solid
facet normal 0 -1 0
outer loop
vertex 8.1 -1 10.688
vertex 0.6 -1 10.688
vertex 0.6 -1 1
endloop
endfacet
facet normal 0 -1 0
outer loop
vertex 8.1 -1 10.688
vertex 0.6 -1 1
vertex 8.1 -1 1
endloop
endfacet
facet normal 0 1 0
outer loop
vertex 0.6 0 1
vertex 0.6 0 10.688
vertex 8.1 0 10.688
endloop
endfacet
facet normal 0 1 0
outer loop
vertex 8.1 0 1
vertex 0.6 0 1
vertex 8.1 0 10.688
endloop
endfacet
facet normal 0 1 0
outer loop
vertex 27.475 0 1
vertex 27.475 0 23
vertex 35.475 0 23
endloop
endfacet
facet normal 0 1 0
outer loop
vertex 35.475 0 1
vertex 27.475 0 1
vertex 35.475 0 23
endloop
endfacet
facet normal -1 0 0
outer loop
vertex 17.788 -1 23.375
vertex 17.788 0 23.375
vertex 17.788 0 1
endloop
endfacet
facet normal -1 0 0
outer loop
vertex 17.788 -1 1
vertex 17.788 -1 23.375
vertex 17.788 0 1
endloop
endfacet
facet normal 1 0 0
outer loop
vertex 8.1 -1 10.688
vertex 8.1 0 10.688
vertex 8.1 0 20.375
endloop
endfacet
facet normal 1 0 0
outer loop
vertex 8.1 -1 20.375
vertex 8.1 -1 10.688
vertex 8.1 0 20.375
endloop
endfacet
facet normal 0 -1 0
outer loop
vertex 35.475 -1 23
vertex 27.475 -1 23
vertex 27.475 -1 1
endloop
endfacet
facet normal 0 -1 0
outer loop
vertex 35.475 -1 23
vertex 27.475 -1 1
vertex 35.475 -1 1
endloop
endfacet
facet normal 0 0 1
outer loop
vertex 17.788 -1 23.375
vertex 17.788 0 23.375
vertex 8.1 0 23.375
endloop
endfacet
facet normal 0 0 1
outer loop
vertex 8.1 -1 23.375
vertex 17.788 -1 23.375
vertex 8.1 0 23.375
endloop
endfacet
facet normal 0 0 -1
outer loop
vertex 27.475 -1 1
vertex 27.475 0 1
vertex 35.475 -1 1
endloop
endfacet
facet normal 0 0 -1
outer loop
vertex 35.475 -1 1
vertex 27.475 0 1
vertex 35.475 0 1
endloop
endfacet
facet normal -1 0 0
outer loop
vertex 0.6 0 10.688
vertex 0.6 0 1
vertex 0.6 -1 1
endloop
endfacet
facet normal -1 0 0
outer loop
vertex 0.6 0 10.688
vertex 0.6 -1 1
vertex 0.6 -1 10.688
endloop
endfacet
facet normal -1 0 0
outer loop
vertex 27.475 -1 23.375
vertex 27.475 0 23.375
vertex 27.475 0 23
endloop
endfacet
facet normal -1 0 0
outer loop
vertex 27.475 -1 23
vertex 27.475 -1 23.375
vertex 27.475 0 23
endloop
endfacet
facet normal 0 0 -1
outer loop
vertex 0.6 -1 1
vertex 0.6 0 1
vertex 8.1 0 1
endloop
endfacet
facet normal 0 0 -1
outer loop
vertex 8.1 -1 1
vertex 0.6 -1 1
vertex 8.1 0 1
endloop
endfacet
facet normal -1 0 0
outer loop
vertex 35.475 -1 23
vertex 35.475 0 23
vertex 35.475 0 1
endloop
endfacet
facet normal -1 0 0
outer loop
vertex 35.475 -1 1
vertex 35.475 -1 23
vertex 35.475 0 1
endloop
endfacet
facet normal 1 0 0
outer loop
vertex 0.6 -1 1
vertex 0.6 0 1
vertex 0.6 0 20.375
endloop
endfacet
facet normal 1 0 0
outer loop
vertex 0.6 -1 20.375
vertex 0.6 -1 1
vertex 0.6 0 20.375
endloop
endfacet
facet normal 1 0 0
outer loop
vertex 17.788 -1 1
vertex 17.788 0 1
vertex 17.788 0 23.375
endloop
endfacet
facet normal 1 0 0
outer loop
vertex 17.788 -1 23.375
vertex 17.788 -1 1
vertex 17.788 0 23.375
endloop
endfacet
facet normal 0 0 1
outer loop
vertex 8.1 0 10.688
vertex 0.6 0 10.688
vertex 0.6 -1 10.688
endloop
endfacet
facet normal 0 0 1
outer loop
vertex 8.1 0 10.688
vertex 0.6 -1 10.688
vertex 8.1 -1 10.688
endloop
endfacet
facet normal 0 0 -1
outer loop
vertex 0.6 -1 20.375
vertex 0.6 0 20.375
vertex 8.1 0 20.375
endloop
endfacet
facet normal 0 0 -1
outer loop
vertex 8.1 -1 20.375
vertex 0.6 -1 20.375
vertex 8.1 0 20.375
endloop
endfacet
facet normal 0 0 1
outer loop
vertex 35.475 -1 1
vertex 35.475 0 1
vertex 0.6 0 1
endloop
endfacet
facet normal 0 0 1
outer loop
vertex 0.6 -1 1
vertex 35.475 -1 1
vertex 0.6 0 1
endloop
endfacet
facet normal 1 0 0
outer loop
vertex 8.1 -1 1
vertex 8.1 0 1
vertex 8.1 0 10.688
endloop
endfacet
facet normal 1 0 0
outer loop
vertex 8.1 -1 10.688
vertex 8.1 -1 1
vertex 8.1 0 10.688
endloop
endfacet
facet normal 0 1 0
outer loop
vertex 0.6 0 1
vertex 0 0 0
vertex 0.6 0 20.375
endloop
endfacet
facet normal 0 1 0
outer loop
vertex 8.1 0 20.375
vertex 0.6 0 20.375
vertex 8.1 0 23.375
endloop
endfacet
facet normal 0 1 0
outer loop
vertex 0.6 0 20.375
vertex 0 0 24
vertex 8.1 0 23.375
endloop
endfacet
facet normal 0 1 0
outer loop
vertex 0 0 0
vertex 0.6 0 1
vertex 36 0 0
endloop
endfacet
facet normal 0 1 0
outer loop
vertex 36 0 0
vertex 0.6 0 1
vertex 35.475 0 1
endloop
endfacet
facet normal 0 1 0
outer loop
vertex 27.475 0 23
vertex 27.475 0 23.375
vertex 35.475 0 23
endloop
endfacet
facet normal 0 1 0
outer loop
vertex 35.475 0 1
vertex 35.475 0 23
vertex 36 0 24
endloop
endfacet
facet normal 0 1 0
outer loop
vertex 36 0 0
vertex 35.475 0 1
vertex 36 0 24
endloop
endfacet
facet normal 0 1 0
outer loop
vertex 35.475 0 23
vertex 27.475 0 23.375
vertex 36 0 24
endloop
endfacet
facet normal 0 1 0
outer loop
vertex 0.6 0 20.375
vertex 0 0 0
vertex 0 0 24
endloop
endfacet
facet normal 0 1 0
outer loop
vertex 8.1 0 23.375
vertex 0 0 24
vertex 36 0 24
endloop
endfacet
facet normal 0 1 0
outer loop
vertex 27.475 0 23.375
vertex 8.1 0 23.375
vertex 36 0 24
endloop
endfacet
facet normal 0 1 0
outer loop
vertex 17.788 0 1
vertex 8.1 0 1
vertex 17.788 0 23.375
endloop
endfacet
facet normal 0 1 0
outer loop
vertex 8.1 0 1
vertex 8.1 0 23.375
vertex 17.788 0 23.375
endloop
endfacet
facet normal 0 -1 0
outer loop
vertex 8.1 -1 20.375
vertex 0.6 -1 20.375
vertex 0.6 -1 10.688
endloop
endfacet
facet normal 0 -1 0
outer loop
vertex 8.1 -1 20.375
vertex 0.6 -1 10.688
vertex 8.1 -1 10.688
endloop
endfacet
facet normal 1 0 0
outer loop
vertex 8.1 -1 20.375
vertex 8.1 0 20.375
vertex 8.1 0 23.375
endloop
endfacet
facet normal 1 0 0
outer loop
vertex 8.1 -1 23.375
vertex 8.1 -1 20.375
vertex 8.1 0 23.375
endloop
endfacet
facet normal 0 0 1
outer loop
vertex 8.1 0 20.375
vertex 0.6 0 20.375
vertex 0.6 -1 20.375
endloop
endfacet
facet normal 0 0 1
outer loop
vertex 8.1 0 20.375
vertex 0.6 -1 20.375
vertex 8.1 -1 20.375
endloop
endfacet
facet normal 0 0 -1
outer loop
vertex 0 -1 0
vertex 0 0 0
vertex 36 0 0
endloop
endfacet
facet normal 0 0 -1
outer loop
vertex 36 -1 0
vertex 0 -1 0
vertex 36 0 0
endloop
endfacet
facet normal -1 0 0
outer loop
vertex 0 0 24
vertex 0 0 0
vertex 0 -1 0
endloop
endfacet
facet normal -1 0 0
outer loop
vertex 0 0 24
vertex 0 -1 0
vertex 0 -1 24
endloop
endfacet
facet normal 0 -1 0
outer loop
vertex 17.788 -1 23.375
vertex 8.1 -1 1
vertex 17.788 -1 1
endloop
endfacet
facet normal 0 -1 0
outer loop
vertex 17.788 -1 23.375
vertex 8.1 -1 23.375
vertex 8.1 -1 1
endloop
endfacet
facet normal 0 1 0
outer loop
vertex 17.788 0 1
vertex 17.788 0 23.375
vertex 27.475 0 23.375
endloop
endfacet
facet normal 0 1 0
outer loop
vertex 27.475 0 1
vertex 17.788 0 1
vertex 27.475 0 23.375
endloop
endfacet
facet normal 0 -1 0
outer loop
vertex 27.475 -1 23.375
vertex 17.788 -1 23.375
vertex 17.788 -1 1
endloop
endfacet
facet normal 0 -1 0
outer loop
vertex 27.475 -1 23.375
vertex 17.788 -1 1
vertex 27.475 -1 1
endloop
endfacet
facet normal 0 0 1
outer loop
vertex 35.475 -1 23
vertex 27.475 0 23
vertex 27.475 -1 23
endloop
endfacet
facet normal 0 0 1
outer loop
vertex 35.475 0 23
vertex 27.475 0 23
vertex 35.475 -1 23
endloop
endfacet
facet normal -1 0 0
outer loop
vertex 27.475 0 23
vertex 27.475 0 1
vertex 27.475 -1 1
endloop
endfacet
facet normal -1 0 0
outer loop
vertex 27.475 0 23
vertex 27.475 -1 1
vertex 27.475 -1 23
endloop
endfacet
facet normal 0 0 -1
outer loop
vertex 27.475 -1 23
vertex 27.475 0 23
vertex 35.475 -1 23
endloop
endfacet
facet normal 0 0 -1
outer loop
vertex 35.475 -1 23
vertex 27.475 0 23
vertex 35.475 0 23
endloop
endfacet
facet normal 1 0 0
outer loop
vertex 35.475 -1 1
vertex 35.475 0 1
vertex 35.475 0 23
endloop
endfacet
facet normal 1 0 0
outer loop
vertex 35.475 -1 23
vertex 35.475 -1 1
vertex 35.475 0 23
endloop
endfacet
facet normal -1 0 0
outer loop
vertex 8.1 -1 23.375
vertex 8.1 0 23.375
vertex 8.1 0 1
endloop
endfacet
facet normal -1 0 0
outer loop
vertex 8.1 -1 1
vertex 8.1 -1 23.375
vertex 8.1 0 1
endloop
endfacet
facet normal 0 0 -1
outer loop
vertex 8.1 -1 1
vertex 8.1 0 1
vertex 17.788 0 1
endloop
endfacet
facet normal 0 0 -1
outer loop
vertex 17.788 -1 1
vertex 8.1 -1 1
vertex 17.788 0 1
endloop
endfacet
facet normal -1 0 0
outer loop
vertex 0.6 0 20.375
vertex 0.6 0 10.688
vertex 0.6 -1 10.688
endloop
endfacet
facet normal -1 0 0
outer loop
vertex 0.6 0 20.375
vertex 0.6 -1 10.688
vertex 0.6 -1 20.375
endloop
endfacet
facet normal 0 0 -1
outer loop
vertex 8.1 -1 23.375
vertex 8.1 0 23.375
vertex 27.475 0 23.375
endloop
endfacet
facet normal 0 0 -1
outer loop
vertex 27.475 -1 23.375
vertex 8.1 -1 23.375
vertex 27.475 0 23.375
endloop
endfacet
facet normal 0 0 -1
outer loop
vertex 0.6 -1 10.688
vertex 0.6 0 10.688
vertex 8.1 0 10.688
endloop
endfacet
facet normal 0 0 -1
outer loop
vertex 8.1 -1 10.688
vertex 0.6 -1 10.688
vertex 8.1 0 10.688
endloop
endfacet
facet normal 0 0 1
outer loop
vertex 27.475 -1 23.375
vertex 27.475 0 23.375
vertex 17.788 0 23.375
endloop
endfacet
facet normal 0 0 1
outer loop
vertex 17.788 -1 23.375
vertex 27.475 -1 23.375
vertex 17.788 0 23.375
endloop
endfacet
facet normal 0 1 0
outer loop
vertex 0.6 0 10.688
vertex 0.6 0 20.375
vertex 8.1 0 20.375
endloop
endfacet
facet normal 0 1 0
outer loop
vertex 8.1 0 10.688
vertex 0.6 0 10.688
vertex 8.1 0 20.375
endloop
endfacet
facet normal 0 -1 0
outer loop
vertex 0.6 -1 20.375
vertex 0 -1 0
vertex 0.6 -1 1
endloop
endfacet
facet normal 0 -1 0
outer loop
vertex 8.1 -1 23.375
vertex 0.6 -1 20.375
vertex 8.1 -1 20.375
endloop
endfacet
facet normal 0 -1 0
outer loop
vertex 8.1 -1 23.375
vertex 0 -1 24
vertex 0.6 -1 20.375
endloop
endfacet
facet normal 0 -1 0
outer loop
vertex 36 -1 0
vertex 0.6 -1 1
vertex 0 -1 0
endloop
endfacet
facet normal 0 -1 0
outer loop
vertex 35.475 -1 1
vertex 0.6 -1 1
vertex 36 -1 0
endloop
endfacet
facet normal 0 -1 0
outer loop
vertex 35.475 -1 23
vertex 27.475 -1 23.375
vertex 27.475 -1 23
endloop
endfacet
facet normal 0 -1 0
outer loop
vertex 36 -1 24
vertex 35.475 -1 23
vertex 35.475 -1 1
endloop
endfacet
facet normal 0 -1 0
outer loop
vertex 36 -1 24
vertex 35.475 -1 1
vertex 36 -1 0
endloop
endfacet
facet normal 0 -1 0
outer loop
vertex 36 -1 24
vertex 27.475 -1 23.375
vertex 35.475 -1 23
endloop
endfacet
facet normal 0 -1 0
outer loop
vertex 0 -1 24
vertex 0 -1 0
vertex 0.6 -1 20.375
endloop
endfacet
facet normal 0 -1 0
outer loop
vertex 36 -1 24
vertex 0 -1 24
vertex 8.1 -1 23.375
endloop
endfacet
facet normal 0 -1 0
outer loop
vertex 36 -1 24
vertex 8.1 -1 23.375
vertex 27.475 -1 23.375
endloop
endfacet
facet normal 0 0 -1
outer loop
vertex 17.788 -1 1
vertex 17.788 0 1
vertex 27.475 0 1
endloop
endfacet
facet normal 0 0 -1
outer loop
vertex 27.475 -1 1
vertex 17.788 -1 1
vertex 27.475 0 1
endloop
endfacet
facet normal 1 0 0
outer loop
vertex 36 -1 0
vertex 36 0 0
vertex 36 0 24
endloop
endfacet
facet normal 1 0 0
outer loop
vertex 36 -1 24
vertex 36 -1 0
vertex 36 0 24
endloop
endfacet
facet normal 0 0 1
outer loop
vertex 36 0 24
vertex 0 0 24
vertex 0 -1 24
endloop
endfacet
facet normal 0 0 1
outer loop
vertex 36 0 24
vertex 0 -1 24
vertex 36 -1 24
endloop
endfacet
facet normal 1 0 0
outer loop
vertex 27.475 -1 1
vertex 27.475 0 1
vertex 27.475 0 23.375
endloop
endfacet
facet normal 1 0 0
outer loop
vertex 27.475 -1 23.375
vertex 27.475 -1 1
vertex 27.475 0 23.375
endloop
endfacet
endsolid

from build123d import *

# Parameters (mm, degrees)
F0_W     = 36
F0_H     = 24
F1_DEPTH = 1
F2_DEPTH = 1
F0_W_2   = 7.5
F0_H_2   = 9.6875
F3_DEPTH = 1
F4_DEPTH = 1
F5_DEPTH = 1
F0_W_3   = 8
F0_H_3   = 22
F6_DEPTH = 1


with BuildPart() as f1:
    # F0 (on Front) → F1 (new body)
    with BuildSketch(Plane.XZ):
        with Locations((18, 12)):
            Rectangle(F0_W, F0_H)
        Polygon((0.6, 1), (0.6, 10.6875), (0.6, 20.375), (8.1, 20.375), (8.1, 23.375), (17.7875, 23.375), (27.475, 23.375), (27.475, 23), (35.475, 23), (35.475, 1), (27.475, 1), (17.7875, 1), (8.1, 1), align=None, mode=Mode.SUBTRACT)
    extrude(amount=F1_DEPTH)


with BuildPart() as f2:
    # F0 (on Front) → F2 (new body)
    with BuildSketch(Plane.XZ):
        Polygon((8.1, 20.375), (8.1, 10.6875), (8.1, 1), (17.7875, 1), (17.7875, 23.375), (8.1, 23.375), align=None)
    extrude(amount=F2_DEPTH)


with BuildPart() as f3:
    # F0 (on Front) → F3 (new body)
    with BuildSketch(Plane.XZ):
        with Locations((4.35, 15.53125)):
            Rectangle(F0_W_2, F0_H_2)
    extrude(amount=F3_DEPTH)


with BuildPart() as f4:
    # F0 (on Front) → F4 (new body)
    with BuildSketch(Plane.XZ):
        with Locations((4.35, 5.84375)):
            Rectangle(F0_W_2, F0_H_2)
    extrude(amount=F4_DEPTH)


with BuildPart() as f5:
    # F0 (on Front) → F5 (new body)
    with BuildSketch(Plane.XZ):
        Polygon((17.7875, 23.375), (17.7875, 1), (27.475, 1), (27.475, 23), (27.475, 23.375), align=None)
    extrude(amount=F5_DEPTH)


with BuildPart() as f6:
    # F0 (on Front) → F6 (new body)
    with BuildSketch(Plane.XZ):
        with Locations((31.475, 12)):
            Rectangle(F0_W_3, F0_H_3)
    extrude(amount=F6_DEPTH)


solid = Compound([f1.part, f2.part, f3.part, f4.part, f5.part, f6.part])
